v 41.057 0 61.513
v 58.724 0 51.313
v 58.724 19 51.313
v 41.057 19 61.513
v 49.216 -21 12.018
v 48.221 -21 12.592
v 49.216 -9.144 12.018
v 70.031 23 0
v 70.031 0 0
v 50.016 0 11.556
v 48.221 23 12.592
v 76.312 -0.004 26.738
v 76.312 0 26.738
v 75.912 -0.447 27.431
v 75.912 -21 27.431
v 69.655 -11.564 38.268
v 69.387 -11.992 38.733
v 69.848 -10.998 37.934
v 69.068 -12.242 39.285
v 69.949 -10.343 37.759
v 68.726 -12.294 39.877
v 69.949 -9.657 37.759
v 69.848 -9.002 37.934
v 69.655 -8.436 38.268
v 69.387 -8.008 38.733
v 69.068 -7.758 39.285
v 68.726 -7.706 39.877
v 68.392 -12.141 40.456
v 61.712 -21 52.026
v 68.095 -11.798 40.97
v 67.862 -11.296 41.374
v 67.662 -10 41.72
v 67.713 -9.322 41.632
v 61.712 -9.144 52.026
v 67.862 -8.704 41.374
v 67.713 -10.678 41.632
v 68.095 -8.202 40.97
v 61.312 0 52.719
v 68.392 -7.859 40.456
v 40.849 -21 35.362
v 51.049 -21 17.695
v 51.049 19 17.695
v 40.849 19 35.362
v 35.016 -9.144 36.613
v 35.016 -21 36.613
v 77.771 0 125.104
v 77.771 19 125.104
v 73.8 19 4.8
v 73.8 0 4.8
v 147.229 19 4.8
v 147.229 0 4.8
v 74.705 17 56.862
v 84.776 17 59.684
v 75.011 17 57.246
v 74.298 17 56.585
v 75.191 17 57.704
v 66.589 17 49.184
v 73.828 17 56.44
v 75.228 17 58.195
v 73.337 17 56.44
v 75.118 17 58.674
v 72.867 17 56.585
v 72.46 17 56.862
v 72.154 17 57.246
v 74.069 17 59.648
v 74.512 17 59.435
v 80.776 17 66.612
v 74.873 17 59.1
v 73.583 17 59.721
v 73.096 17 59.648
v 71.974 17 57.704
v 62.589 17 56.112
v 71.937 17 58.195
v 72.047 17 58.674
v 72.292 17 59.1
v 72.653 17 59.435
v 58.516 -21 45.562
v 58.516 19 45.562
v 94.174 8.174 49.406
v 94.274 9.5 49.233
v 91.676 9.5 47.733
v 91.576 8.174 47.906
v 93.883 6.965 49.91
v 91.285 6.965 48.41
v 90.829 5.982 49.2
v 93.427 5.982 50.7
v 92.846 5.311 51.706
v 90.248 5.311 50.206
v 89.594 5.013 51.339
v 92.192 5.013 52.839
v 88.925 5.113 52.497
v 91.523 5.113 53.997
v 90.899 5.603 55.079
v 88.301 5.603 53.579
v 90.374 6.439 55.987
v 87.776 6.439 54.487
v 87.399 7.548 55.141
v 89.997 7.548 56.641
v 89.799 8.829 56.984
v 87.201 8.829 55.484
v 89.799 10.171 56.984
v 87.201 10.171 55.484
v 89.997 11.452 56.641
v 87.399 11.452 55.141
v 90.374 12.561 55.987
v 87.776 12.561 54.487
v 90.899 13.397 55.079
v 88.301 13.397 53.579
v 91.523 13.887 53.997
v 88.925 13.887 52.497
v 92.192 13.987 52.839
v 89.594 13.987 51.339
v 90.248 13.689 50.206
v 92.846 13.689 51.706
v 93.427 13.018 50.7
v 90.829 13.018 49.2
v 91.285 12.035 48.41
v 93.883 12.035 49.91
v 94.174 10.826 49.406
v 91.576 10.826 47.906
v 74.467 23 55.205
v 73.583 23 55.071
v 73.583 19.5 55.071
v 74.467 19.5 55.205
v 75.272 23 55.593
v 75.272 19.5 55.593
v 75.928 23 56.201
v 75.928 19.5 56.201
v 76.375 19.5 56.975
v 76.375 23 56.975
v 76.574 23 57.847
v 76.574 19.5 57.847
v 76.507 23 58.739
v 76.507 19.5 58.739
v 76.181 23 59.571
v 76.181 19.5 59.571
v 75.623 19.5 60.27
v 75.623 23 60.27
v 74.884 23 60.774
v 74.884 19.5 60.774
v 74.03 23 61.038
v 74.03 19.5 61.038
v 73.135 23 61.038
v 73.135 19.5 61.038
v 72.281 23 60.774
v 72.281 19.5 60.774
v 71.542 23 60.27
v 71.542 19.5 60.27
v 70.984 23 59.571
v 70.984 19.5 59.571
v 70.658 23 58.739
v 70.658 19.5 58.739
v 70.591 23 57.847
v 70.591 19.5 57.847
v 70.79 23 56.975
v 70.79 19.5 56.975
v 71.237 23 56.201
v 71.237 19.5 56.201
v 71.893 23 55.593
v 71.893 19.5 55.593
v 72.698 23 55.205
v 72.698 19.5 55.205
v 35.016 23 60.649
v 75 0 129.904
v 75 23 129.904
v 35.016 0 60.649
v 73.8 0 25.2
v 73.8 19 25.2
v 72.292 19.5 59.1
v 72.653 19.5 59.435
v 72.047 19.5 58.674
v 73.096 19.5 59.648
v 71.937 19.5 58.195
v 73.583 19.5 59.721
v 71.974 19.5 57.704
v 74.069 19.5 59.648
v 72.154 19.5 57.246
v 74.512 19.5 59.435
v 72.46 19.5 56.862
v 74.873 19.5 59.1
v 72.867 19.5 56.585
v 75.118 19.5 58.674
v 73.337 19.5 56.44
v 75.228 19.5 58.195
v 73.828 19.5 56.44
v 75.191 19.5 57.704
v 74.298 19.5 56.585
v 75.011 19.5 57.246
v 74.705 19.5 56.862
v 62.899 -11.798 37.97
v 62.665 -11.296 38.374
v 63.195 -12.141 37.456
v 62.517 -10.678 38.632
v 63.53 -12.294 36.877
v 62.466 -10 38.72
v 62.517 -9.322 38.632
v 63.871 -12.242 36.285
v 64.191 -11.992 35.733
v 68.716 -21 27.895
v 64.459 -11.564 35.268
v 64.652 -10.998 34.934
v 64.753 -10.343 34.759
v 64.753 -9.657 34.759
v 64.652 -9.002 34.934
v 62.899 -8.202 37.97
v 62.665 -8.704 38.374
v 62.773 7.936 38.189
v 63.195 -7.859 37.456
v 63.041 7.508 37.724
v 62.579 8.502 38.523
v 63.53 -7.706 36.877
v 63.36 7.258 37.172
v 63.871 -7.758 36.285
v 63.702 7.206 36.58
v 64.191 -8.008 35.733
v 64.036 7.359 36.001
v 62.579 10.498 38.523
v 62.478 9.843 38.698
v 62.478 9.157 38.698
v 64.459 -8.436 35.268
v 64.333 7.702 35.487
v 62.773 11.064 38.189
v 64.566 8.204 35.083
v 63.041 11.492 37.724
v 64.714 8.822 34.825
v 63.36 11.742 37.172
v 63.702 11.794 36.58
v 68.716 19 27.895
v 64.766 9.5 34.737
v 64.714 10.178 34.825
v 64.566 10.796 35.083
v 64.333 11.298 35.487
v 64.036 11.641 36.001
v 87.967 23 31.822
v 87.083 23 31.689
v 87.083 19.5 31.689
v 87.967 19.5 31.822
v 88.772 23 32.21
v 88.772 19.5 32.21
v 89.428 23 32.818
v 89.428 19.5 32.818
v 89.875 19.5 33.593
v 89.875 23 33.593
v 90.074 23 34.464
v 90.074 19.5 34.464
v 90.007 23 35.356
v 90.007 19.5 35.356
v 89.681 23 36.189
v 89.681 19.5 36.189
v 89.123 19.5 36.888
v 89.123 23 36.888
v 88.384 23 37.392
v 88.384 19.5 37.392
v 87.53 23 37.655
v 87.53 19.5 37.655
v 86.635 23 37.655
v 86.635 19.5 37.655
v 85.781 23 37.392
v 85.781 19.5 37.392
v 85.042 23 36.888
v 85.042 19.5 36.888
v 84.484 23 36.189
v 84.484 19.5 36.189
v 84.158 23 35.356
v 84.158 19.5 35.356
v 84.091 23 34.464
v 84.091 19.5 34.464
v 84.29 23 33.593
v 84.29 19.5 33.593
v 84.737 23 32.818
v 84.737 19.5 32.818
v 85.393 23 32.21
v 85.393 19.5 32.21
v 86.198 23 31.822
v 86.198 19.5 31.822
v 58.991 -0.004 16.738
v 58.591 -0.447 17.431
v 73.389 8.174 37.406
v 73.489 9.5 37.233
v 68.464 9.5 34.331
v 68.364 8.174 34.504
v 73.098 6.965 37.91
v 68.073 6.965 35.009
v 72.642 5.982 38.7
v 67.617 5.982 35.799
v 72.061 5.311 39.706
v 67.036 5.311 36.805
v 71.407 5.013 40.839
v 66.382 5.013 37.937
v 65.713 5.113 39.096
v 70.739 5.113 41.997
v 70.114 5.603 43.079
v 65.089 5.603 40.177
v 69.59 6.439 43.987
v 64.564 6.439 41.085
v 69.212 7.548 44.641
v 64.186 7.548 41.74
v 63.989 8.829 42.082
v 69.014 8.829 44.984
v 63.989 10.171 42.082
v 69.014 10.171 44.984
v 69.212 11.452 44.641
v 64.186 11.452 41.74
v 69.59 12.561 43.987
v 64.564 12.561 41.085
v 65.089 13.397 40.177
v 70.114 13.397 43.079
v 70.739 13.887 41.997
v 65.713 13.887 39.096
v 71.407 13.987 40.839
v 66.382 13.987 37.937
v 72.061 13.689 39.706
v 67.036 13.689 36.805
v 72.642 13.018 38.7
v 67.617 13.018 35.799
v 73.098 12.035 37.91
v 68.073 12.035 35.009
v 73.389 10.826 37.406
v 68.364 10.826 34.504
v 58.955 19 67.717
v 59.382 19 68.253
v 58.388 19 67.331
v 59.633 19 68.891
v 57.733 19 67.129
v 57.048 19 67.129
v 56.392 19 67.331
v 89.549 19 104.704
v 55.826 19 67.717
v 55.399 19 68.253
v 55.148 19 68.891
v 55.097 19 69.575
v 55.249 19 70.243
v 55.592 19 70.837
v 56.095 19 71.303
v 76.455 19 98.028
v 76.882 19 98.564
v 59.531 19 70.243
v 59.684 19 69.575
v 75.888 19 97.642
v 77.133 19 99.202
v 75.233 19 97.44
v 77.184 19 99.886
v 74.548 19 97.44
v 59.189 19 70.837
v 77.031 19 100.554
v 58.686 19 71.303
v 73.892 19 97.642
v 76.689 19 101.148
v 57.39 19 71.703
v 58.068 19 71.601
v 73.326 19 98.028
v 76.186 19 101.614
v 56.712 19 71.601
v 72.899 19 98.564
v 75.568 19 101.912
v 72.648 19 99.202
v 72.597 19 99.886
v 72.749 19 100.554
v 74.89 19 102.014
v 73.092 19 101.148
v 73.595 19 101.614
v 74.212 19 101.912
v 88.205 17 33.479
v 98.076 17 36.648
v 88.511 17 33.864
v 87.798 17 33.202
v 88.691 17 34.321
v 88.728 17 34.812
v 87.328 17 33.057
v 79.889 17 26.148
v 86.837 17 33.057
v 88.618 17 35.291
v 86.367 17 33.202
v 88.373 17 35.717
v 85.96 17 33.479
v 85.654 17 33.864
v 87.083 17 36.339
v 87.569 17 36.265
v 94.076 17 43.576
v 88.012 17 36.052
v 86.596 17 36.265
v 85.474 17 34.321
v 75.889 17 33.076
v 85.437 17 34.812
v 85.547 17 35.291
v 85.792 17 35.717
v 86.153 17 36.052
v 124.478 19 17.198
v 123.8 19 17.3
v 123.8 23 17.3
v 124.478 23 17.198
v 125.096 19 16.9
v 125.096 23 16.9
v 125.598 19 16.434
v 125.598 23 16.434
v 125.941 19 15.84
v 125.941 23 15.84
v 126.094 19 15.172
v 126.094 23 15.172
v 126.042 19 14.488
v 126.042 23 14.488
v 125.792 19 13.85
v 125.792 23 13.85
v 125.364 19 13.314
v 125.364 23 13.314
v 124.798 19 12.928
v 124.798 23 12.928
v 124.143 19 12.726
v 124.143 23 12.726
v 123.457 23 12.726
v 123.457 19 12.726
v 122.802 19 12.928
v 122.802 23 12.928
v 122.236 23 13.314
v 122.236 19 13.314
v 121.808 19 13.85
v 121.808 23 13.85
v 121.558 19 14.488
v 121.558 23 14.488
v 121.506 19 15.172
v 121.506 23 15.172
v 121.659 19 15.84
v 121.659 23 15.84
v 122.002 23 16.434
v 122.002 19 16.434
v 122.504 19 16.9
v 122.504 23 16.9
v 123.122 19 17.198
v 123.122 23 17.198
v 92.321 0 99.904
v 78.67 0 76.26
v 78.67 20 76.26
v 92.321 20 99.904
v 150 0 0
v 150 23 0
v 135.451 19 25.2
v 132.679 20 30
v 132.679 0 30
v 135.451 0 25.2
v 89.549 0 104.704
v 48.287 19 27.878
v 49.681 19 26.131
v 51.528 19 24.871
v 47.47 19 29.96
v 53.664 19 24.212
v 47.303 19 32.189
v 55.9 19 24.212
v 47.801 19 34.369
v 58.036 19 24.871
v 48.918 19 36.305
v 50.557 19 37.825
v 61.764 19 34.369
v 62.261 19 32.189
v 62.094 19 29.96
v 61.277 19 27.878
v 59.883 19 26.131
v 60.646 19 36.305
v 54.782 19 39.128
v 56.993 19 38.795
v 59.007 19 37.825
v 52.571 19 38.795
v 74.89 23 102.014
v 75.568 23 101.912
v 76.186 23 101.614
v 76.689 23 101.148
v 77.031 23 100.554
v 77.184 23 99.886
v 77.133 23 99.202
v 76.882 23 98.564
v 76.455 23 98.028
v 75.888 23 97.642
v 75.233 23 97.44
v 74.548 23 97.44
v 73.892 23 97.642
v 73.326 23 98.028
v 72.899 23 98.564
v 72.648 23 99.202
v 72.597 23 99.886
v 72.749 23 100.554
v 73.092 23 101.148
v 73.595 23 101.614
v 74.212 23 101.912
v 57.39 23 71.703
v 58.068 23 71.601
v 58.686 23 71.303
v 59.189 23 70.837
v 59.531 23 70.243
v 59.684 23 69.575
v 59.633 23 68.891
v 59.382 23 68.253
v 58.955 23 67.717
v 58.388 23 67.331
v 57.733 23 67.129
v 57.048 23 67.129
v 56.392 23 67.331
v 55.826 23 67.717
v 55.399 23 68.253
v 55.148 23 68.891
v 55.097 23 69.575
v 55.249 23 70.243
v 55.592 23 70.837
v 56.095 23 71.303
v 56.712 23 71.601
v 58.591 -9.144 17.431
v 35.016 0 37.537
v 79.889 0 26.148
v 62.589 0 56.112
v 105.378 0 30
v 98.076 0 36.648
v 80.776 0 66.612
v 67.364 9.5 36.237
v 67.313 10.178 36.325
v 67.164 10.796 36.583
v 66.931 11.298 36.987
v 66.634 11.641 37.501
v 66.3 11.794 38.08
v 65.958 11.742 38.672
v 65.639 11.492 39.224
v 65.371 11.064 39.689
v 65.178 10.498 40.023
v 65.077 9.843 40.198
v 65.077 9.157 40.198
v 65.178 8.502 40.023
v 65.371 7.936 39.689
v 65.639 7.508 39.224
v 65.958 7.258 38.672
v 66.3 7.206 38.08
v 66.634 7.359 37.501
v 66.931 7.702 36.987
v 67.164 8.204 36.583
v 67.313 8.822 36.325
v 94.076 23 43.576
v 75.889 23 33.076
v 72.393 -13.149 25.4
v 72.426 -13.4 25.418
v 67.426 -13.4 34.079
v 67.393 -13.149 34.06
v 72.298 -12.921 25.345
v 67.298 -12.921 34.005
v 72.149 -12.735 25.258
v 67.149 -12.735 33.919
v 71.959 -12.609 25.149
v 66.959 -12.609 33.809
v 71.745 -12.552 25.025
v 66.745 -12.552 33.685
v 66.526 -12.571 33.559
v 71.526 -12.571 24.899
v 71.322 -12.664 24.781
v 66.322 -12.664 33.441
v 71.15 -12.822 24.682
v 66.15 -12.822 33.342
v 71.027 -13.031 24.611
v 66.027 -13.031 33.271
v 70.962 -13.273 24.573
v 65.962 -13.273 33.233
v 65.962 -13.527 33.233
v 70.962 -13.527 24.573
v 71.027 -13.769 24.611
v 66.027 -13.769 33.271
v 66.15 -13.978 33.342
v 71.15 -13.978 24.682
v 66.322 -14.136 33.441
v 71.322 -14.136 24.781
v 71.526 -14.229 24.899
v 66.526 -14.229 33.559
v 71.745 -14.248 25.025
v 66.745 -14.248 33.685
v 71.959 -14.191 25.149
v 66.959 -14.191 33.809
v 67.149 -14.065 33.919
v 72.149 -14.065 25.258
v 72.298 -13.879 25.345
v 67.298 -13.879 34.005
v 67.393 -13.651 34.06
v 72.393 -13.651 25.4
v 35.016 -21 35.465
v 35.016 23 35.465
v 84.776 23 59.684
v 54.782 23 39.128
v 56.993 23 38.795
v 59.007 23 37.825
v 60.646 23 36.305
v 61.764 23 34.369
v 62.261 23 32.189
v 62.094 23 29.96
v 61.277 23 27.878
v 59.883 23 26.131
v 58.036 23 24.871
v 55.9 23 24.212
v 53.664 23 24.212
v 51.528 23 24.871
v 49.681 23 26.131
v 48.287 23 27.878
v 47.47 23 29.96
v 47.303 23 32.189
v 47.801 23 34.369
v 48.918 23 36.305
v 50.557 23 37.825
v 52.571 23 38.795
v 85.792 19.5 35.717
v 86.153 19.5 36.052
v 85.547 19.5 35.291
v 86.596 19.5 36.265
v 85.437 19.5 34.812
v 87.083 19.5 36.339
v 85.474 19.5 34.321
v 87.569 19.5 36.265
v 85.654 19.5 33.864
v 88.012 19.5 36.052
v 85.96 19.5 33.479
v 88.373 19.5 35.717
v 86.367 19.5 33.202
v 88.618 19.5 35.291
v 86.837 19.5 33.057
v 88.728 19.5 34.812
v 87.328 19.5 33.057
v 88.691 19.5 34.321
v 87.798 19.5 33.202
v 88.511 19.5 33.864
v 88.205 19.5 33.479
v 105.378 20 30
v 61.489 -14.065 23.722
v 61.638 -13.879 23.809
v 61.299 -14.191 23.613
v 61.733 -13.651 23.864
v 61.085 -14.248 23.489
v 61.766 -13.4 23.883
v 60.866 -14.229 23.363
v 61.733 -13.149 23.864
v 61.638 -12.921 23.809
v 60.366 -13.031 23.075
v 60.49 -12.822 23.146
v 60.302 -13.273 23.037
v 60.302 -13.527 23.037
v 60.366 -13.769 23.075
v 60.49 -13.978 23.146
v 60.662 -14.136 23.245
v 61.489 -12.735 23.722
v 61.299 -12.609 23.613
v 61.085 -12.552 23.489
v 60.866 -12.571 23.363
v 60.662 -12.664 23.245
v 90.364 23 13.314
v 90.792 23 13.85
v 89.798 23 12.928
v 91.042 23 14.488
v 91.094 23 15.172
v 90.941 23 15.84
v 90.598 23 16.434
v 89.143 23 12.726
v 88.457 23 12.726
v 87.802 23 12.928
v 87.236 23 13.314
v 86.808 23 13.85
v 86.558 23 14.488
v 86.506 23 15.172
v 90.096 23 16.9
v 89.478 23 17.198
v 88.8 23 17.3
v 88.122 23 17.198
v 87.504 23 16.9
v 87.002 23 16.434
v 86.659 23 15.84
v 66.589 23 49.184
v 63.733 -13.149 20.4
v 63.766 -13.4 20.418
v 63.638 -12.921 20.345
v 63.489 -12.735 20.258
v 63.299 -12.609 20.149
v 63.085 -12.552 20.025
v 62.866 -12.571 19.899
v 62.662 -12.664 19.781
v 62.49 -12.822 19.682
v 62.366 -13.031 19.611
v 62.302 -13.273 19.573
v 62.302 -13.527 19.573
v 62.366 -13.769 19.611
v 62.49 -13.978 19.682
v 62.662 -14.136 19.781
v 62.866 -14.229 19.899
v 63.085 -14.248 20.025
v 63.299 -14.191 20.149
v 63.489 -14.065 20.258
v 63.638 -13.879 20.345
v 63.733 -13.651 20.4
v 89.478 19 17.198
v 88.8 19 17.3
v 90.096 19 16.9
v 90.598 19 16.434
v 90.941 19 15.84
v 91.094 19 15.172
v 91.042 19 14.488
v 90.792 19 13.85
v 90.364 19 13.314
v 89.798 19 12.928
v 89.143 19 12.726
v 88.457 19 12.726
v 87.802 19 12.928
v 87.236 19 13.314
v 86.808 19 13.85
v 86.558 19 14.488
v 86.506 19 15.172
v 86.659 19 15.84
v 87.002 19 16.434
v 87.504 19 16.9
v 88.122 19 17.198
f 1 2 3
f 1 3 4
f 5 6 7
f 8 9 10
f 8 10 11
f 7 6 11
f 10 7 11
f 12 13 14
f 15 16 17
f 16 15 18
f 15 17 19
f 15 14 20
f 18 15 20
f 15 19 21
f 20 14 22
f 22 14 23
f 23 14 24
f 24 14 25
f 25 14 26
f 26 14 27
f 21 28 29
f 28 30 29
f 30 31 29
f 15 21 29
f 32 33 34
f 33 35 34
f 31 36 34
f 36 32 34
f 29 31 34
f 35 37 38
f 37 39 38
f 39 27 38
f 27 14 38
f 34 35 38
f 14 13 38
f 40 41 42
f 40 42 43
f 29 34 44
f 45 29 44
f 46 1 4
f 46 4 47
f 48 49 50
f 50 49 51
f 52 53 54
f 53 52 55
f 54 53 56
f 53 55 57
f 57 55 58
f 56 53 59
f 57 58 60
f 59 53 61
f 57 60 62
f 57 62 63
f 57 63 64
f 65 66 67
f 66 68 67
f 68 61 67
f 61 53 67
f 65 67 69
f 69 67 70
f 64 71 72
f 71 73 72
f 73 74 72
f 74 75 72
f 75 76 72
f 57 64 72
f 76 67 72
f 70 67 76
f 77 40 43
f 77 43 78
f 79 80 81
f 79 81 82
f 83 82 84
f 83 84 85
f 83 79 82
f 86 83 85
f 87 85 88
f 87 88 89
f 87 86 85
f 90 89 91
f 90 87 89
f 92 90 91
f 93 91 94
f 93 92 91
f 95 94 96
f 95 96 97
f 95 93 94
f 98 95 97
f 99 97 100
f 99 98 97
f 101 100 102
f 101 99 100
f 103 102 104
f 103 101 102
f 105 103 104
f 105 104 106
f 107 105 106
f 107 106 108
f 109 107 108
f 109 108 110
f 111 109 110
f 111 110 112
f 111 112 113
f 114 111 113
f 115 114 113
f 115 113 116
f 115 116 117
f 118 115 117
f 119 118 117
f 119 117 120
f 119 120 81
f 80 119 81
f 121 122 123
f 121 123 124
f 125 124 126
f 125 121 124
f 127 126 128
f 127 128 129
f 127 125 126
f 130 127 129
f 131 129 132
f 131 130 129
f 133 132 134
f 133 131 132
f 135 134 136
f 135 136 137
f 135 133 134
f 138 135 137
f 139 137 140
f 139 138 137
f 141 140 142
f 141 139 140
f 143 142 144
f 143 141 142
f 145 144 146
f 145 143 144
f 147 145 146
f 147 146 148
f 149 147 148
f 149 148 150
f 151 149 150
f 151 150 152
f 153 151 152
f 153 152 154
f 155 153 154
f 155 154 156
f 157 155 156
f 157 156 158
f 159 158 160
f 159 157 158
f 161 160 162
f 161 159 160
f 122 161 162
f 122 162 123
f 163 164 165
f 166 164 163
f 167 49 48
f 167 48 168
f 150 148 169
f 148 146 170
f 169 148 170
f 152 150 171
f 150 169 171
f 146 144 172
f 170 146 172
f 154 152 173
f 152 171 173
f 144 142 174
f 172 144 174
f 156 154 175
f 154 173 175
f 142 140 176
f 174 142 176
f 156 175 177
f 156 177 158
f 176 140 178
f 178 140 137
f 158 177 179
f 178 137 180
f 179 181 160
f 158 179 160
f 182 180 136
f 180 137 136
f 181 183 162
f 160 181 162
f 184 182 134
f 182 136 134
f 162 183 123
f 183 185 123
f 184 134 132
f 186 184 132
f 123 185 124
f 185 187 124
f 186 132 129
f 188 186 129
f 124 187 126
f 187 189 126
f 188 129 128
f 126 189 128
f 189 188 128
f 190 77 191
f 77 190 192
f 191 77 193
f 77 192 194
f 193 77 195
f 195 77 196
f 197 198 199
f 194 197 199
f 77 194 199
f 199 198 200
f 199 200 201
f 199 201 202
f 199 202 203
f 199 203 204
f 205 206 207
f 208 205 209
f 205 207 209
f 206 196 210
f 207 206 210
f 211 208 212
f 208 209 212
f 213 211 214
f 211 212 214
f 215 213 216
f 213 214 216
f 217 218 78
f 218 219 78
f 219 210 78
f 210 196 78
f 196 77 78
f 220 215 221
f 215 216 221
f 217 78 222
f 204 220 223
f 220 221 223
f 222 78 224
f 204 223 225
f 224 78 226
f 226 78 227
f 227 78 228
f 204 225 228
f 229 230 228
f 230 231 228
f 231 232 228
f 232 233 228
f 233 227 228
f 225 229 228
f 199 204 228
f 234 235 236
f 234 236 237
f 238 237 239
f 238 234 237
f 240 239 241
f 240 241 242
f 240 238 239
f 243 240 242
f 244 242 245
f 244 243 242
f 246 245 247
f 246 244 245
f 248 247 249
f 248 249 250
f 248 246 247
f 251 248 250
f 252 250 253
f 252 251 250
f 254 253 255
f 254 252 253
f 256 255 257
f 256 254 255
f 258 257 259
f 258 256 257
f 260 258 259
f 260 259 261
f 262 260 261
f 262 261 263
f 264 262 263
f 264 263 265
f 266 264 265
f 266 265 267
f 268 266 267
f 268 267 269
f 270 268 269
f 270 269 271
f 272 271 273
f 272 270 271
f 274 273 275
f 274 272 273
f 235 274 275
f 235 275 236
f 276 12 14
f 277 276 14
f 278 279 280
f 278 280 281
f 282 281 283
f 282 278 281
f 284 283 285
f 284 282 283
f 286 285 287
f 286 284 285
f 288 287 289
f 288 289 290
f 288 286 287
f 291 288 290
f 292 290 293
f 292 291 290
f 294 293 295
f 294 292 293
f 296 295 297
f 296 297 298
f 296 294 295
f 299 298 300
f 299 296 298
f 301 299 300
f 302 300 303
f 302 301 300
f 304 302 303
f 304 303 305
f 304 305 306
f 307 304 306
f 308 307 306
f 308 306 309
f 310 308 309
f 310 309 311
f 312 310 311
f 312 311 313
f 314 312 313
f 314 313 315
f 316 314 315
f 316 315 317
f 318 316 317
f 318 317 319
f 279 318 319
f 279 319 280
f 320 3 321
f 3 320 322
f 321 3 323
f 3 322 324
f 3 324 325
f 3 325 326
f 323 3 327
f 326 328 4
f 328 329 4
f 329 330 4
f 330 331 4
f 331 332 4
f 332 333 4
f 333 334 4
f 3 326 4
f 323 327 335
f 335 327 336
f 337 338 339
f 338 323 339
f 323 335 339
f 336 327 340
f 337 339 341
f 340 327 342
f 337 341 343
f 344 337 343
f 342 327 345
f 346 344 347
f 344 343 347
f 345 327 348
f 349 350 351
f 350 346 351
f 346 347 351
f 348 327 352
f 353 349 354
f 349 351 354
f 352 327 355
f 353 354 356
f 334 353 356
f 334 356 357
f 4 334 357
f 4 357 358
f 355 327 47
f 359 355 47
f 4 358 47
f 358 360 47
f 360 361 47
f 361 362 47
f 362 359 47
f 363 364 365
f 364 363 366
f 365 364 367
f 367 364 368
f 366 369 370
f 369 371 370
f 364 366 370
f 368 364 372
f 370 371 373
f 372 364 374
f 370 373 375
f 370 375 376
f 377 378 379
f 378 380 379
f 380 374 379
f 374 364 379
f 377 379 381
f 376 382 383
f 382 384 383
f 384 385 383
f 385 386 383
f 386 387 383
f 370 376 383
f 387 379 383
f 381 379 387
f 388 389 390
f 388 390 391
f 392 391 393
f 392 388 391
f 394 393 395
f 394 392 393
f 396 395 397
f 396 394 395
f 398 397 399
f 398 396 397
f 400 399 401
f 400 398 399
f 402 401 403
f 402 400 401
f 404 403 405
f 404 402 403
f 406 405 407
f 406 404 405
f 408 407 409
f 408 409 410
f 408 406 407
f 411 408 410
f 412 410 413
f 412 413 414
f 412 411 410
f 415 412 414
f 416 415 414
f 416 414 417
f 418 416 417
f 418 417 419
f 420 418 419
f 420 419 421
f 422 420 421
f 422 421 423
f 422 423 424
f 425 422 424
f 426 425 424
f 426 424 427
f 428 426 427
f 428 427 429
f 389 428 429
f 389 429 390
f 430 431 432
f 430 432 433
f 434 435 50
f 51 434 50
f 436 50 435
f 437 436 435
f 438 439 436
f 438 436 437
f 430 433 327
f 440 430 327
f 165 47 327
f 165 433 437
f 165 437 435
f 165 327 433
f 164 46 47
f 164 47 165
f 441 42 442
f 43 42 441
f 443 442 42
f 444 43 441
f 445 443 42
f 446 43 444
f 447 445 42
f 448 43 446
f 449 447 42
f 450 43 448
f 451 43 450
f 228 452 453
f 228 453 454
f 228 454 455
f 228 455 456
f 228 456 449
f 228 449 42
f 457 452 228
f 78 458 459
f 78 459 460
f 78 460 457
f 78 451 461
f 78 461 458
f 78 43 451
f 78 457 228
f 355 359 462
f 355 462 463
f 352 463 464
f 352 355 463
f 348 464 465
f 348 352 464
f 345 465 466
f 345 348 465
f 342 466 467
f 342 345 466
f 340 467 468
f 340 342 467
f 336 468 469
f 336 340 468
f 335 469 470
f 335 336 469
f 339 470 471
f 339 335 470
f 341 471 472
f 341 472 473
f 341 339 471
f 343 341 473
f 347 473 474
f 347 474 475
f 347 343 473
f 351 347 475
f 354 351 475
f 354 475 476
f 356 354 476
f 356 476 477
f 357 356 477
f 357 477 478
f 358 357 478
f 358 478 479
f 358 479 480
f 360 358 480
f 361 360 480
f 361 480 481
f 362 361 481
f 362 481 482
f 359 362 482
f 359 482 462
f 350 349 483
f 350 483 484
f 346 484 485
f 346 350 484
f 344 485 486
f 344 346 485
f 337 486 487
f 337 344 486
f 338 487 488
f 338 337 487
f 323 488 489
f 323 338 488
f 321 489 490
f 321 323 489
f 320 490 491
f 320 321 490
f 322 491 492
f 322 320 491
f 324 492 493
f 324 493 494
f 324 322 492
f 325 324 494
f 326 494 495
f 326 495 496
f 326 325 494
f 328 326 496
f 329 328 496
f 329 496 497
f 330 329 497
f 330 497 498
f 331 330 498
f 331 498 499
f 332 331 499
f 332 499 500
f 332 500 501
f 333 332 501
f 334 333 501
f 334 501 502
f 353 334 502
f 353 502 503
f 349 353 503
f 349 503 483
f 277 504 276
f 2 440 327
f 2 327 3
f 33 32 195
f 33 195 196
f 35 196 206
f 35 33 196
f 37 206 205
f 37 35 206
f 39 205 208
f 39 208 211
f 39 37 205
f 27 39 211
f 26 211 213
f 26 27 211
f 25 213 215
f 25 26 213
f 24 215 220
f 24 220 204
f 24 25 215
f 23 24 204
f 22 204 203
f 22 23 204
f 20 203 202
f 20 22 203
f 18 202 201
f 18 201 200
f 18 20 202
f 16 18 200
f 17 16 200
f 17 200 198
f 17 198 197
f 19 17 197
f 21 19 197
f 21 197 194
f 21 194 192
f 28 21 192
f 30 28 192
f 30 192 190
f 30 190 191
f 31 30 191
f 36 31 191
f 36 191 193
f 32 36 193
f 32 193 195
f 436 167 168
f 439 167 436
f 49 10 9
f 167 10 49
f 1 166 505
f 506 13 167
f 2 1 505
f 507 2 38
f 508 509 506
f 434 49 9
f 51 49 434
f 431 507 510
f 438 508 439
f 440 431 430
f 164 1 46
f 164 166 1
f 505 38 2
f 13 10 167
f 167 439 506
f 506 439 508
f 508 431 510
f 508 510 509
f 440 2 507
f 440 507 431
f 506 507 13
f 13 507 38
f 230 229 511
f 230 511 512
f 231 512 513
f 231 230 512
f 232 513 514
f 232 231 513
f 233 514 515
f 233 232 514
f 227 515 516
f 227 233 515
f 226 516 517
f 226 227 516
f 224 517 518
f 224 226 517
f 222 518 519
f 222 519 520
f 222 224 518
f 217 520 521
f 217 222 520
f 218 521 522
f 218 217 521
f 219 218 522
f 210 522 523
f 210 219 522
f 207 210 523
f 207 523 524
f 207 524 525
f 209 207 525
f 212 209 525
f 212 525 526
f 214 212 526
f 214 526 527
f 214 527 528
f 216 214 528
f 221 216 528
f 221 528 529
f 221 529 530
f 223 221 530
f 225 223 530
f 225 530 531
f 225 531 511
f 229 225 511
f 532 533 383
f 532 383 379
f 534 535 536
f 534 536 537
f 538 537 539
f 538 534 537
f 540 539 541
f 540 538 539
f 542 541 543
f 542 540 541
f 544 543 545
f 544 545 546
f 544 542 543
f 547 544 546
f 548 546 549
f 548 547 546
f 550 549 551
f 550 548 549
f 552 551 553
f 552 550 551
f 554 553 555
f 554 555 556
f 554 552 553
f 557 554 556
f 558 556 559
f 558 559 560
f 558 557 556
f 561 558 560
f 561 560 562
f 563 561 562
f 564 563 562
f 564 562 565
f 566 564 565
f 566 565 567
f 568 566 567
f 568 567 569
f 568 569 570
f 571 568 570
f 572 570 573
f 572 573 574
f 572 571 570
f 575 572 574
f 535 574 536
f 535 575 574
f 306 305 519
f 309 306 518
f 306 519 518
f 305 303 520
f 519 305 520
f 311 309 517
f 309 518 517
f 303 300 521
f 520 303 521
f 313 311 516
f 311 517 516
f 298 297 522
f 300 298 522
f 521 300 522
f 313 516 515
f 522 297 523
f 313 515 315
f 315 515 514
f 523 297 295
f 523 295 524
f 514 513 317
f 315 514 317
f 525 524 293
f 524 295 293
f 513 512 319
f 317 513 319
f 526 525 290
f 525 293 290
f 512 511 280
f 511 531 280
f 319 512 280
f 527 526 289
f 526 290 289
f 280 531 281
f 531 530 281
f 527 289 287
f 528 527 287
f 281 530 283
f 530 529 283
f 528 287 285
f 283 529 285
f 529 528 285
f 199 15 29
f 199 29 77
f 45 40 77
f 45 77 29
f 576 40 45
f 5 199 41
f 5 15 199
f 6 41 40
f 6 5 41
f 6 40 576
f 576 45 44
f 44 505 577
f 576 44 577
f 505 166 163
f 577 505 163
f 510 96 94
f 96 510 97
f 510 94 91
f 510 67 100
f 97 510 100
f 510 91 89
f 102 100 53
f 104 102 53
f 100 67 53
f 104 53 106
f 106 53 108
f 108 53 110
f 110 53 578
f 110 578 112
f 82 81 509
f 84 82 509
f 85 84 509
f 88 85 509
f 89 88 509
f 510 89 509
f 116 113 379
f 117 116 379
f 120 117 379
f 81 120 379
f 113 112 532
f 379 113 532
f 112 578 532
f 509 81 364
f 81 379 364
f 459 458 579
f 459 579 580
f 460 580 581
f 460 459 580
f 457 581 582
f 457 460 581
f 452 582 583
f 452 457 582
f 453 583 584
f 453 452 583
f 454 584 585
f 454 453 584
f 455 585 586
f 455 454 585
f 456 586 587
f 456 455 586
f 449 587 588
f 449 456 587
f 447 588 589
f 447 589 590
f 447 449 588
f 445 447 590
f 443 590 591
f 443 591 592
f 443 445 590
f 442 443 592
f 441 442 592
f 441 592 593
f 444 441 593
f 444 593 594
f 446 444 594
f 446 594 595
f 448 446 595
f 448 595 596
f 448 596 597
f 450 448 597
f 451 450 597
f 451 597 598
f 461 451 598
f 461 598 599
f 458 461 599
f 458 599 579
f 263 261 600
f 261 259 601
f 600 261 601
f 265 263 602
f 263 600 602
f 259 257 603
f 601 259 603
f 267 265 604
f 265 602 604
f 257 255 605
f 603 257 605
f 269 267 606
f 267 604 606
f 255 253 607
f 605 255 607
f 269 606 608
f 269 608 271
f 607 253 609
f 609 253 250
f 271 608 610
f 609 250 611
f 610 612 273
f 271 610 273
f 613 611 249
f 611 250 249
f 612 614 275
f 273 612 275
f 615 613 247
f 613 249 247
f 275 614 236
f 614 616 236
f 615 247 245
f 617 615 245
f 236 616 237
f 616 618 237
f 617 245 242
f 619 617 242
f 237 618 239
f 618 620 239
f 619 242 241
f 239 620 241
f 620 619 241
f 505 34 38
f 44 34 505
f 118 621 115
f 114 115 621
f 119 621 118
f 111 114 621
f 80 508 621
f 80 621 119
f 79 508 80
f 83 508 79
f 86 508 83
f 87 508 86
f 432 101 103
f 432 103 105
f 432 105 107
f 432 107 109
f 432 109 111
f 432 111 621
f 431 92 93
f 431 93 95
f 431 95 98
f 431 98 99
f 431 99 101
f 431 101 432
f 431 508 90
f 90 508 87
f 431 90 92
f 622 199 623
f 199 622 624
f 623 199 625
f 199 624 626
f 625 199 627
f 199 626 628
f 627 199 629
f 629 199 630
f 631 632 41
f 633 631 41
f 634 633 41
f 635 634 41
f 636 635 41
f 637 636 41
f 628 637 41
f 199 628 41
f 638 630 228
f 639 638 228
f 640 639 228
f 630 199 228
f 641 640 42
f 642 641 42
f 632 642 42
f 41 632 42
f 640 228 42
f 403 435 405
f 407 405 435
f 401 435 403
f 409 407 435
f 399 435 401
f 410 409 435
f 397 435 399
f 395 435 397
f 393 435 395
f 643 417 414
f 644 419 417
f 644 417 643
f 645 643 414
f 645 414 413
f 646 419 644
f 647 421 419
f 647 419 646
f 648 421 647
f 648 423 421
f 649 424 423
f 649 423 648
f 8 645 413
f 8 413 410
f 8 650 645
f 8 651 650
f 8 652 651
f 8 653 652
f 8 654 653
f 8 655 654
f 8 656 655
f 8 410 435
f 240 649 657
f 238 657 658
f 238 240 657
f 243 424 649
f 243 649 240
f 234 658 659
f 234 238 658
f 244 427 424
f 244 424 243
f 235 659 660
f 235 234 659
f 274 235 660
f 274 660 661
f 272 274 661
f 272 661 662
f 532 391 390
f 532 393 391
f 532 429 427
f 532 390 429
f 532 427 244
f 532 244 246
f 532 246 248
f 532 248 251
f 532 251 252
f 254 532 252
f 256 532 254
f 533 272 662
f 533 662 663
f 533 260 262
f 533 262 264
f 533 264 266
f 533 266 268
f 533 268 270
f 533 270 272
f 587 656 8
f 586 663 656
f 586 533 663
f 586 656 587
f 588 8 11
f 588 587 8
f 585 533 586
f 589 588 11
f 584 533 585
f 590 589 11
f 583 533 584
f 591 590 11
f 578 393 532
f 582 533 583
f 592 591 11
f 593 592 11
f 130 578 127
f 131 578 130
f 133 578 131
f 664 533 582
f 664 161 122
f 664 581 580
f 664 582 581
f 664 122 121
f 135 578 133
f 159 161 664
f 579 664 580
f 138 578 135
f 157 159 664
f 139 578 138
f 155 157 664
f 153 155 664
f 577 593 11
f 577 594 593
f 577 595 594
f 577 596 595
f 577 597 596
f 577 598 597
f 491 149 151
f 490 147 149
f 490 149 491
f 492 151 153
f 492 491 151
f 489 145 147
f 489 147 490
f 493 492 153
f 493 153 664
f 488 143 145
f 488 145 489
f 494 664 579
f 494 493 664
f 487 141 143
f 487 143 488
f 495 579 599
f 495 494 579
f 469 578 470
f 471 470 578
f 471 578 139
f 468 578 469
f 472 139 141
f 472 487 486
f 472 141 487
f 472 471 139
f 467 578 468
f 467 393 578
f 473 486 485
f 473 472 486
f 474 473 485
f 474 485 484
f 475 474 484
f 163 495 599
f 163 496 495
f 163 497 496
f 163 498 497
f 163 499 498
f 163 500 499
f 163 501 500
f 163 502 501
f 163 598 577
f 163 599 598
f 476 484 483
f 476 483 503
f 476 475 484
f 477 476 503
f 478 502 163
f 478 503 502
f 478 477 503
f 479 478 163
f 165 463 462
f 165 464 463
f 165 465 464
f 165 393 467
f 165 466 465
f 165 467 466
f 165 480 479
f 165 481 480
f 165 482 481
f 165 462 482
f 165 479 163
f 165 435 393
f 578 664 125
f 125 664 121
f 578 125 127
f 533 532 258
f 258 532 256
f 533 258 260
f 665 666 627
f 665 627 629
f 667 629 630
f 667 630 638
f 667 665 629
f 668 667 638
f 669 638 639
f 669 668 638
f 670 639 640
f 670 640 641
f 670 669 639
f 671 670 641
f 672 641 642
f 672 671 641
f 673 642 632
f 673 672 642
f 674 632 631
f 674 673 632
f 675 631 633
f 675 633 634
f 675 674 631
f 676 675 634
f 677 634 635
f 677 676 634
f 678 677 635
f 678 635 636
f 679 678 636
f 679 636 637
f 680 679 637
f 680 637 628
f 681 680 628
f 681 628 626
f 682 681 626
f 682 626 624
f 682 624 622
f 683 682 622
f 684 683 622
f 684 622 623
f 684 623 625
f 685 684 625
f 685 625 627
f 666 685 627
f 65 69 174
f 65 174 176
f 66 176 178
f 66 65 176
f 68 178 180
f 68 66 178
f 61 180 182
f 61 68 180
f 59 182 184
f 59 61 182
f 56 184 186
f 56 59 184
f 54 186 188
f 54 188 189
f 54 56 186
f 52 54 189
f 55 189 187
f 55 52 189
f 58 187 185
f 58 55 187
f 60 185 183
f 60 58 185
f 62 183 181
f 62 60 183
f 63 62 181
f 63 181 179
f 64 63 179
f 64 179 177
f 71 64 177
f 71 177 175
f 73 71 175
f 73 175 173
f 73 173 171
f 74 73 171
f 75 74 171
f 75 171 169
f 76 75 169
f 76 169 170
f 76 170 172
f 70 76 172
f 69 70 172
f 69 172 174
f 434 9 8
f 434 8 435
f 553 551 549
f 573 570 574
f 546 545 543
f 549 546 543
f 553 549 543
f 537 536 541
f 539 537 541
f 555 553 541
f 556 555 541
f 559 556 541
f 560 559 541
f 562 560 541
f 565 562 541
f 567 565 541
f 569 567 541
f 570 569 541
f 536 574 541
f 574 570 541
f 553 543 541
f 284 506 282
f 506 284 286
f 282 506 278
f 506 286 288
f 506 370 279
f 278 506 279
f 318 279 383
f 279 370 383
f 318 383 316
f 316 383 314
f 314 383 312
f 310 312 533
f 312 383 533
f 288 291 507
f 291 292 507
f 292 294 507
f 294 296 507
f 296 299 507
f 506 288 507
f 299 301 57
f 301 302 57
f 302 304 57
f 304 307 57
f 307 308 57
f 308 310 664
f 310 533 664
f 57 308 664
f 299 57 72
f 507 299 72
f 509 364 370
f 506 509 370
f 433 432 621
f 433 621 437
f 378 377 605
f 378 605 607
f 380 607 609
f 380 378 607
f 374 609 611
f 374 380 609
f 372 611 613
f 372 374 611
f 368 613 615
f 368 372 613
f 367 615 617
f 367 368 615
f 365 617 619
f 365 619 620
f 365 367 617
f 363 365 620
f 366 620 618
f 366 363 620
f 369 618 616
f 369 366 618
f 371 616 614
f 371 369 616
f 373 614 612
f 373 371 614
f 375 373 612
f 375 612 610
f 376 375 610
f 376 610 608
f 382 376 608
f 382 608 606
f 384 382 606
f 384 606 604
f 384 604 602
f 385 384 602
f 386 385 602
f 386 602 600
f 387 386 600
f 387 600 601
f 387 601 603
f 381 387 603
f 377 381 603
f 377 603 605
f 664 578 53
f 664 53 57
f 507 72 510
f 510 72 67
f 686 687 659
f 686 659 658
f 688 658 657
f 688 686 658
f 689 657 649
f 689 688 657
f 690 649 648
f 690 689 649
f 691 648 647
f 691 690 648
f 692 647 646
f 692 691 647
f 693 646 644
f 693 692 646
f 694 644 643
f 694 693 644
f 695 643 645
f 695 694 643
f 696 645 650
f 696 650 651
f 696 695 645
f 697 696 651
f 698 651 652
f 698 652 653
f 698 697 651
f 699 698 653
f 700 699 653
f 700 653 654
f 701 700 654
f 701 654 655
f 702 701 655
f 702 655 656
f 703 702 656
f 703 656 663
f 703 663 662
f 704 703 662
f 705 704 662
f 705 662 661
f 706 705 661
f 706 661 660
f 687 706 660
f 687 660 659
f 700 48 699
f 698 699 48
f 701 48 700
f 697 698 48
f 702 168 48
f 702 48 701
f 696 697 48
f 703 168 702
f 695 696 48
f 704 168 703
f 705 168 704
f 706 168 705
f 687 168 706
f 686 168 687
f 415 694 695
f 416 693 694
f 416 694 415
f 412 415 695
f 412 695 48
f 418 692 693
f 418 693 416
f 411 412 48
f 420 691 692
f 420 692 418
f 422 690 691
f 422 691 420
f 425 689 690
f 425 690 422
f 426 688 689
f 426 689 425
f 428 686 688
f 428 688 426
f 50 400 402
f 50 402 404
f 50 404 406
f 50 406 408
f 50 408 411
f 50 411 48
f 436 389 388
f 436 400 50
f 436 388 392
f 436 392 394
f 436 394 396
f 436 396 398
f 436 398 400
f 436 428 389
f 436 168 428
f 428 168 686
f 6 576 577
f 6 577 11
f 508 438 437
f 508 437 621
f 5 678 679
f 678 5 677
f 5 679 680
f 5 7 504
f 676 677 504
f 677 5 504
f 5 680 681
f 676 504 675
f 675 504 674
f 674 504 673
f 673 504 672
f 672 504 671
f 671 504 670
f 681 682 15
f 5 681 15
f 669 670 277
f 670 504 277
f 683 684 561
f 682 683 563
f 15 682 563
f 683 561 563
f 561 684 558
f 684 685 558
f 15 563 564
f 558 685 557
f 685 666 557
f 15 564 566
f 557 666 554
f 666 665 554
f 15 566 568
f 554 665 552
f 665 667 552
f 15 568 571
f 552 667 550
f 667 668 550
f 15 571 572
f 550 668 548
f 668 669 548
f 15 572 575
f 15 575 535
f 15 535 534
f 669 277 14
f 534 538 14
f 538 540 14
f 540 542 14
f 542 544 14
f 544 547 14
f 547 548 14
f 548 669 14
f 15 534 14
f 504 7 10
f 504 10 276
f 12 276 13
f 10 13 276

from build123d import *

# Parameters (mm, degrees)
BOSS_EXTRUDE1_DEPTH      = 23
SKETCH2_W                = 100.39999999999999
SKETCH2_H                = 20.400000000000002
CUT_EXTRUDE2_DEPTH       = 19
CUT_EXTRUDE3_DEPTH       = 19
CUT_EXTRUDE11_DEPTH      = 200.75985582694003
CUT_EXTRUDE11_DEPTH_BACK = 200.75985582694003
CUT_EXTRUDE10_DEPTH      = 20
SKETCH38_R               = 2.299999999999993
SKETCH38_R_2             = 2.300000000000006
SKETCH38_R_3             = 2.2999999999999985
SKETCH38_R_4             = 2.299999999999992
CUT_EXTRUDE24_DEPTH      = 10
BOSS_EXTRUDE2_DEPTH      = 6
SKETCH40_R               = 1.6500000000000017
CUT_EXTRUDE25_DEPTH      = 200.1582285520733
SKETCH41_R               = 3.0000000000000084
CUT_EXTRUDE26_DEPTH      = 3.5
SKETCH45_R               = 2.3
CUT_EXTRUDE29_DEPTH      = 130.1236252028075
SKETCH47_R               = 7.499999999999999
CUT_EXTRUDE31_DEPTH      = 10
CUT_EXTRUDE32_DEPTH      = 200.75985582694003
BOSS_EXTRUDE3_DEPTH      = 21
CUT_EXTRUDE33_DEPTH      = 200.75985582694003
CHAMFER6_SIZE            = 0.8
CHAMFER6_SIZE2           = 9.144041842209413
SKETCH51_R               = 4.5
CUT_EXTRUDE34_DEPTH      = 29.803050969
SKETCH52_R               = 2.3
CUT_EXTRUDE35_DEPTH      = 10
SKETCH53_W               = 20.000000000000007
SKETCH53_H               = 20
CUT_EXTRUDE36_DEPTH      = 10
SKETCH54_R               = 0.8500000000000069
CUT_EXTRUDE37_DEPTH      = 10
CHAMFER7_SIZE            = 1
CHAMFER7_SIZE_2          = 1.710027066
CHAMFER5_SIZE            = 14.54
CHAMFER4_SIZE            = 14.54


with BuildPart() as part:
    # Sketch1 → Boss-Extrude1 (new body)
    with BuildSketch(Plane(origin=(0, 0, 0), x_dir=(1, 0, 0), z_dir=(0, 1, 0))):
        Polygon((0, 0), (149.99999999999937, 0), (74.99999999999966, 129.903810567666), align=None)
    extrude(amount=BOSS_EXTRUDE1_DEPTH)

    # Sketch2 → Cut-Extrude2 (cut)
    with BuildSketch(Plane(origin=(0, 0, 0), x_dir=(1, 0, 0), z_dir=(0, 1, 0))):
        Polygon((108.9238401753675, 138.2616253392494), (58.72384017536752, 51.31267479929176), (41.05692193816496, 61.51267479929177), (91.25692193816495, 148.4616253392494), align=None)
        with Locations((124, 15.000000000000002)):
            Rectangle(SKETCH2_W, SKETCH2_H)
    extrude(amount=CUT_EXTRUDE2_DEPTH, mode=Mode.SUBTRACT)

    # Sketch4 → Cut-Extrude3 (cut)
    with BuildSketch(Plane(origin=(0, 0, 0), x_dir=(1, 0, 0), z_dir=(0, 1, 0))):
        Polygon((58.51558394542647, 45.56193363414623), (40.84866570822394, 35.36193363414623), (51.048665708223936, 17.69501539694368), (68.71558394542647, 27.895015396943673), align=None)
    extrude(amount=CUT_EXTRUDE3_DEPTH, mode=Mode.SUBTRACT)

    # Sketch22 → Cut-Extrude11 (cut, two sides: drawn at the far end of the back side and taken through both)
    with BuildSketch(Plane.XZ.offset(-CUT_EXTRUDE11_DEPTH_BACK)):
        Polygon((79.88924971530794, -26.147760514529192), (62.58924971530795, -56.11223948547077), (80.77578319478118, -66.61223948547077), (98.07578319478117, -36.64776051452918), align=None)
    extrude(amount=CUT_EXTRUDE11_DEPTH + CUT_EXTRUDE11_DEPTH_BACK, mode=Mode.SUBTRACT)

    # Sketch21 → Cut-Extrude10 (cut)
    with BuildSketch(Plane.XZ):
        Polygon((132.67949192431067, -29.999999999999993), (105.37797113249052, -29.999999999999993), (78.6697476797782, -76.26000000000042), (92.32050807568827, -99.90381056766569), align=None)
    extrude(amount=-CUT_EXTRUDE10_DEPTH, mode=Mode.SUBTRACT)

    # Sketch38 → Cut-Extrude24 (cut)
    with BuildSketch(Plane.XZ.offset(-19)):
        with Locations(Location((88.79999999999998, -15, 0), (0, 0, 270))):
            Circle(SKETCH38_R)
        with Locations(Location((123.8, -15, 0), (0, 0, 270))):
            Circle(SKETCH38_R_2)
        with Locations(Location((57.390381056766245, -69.40305585605834, 0), (0, 0, 270))):
            Circle(SKETCH38_R_3)
        with Locations(Location((74.89038105676623, -99.7139449885137, 0), (0, 0, 270))):
            Circle(SKETCH38_R_4)
    extrude(amount=-CUT_EXTRUDE24_DEPTH, mode=Mode.SUBTRACT)

    # Sketch39 → Boss-Extrude2 (add)
    with BuildSketch(Plane(origin=(0, 23, 0), x_dir=(1, 0, 0), z_dir=(0, 1, 0))):
        Polygon((62.58924971530795, 56.11223948547077), (80.77578319478118, 66.61223948547077), (84.77578319478118, 59.68403625519526), (66.58924971530797, 49.18403625519524), align=None)
        Polygon((98.07578319478117, 36.64776051452918), (79.88924971530794, 26.147760514529192), (75.88924971530795, 33.0759637448047), (94.07578319478117, 43.575963744804696), align=None)
    extrude(amount=-BOSS_EXTRUDE2_DEPTH)

    # Sketch40 → Cut-Extrude25 (cut, through all)
    with BuildSketch(Plane.XZ.offset(-17)):
        with Locations(Location((87.08251645504455, -34.68865704891005, 0), (0, 0, 270))):
            Circle(SKETCH40_R)
        with Locations(Location((73.58251645504457, -58.071342951089896, 0), (0, 0, 270))):
            Circle(SKETCH40_R)
    extrude(amount=-CUT_EXTRUDE25_DEPTH, mode=Mode.SUBTRACT)

    # Sketch41 → Cut-Extrude26 (cut)
    with BuildSketch(Plane(origin=(0, 23, 0), x_dir=(1, 0, 0), z_dir=(0, 1, 0))):
        with Locations(Location((73.58251645504457, 58.071342951089896, 0), (0, 0, 270))):
            Circle(SKETCH41_R)
        with Locations(Location((87.08251645504455, 34.68865704891005, 0), (0, 0, 270))):
            Circle(SKETCH41_R)
    extrude(amount=-CUT_EXTRUDE26_DEPTH, mode=Mode.SUBTRACT)

    # Sketch45 → Cut-Extrude29 (cut, through all)
    with BuildSketch(Plane(origin=(63.615583945425506, 0, -36.72847451554663), x_dir=(0.5, 0, 0.8660254037844386), z_dir=(-0.8660254037844387, 0, 0.5000000000000001))):
        with Locations((1.94809e-12, 9.5)):
            Circle(SKETCH45_R)
    extrude(amount=-CUT_EXTRUDE29_DEPTH, mode=Mode.SUBTRACT)

    # Sketch47 → Cut-Extrude31 (cut)
    with BuildSketch(Plane.XZ.offset(-19)):
        with Locations(Location((54.78212482682521, -31.62847451554496, 0), (0, 0, 270))):
            Circle(SKETCH47_R)
    extrude(amount=-CUT_EXTRUDE31_DEPTH, mode=Mode.SUBTRACT)

    # Sketch48 → Cut-Extrude32 (cut, through all)
    with BuildSketch(Plane.XZ):
        Polygon((55.491384919067684, 2e-17), (27.74569245953363, -48.05694903109369), (0, 0), align=None)
    extrude(amount=-CUT_EXTRUDE32_DEPTH, mode=Mode.SUBTRACT)

    # Sketch49 → Boss-Extrude3 (add)
    with BuildSketch(Plane.XZ):
        Polygon((48.718538689301745, -11.730913781805928), (75.91173636813312, -27.430913781805906), (61.7117363681331, -52.026035249283986), (34.51853868930174, -36.326035249284), align=None)
    extrude(amount=BOSS_EXTRUDE3_DEPTH)

    # Sketch50 → Cut-Extrude33 (cut, through all)
    with BuildSketch(Plane(origin=(0, 0, 0), x_dir=(1, 0, 0), z_dir=(0, 1, 0))):
        Polygon((40.84866570822394, 35.36193363414623), (58.51558394542647, 45.56193363414623), (68.71558394542649, 27.895015396943673), (51.048665708223936, 17.69501539694368), align=None)
    extrude(amount=-CUT_EXTRUDE33_DEPTH, mode=Mode.SUBTRACT)

    # Chamfer6
    chamfer6_edges = [part.edges().sort_by_distance(p)[0] for p in [
        (48.115137528717426, 0, -44.17603524928399),
        (62.31513752871743, 0, -19.58091378180592),
    ]]
    chamfer6_side = [part.faces().sort_by_distance(p)[0] for p in [
        (48.99845735329998, 0, -54.86781762841321),
    ]]
    chamfer(chamfer6_edges, length=CHAMFER6_SIZE, length2=CHAMFER6_SIZE2, reference=chamfer6_side[0])

    # Sketch51 → Cut-Extrude34 (cut)
    with BuildSketch(Plane(origin=(92.02385940613446, 0, -53.129999999999995), x_dir=(-0.4999999999999997, 0, -0.8660254037844388), z_dir=(0.8660254037844388, 0, -0.4999999999999997))):
        with Locations(Location((-1.92901e-12, 9.5, 0), (0, 0, 180))):
            Circle(SKETCH51_R)
    extrude(amount=-CUT_EXTRUDE34_DEPTH, mode=Mode.SUBTRACT)

    # Sketch52 → Cut-Extrude35 (cut)
    with BuildSketch(Plane(origin=(68.8117363681321, 0, -39.72847451554662), x_dir=(-0.49999999999999983, 0, -0.8660254037844387), z_dir=(0.8660254037844387, 0, -0.49999999999999983))):
        with Locations((-1.388e-14, -10)):
            Circle(SKETCH52_R)
    extrude(amount=-CUT_EXTRUDE35_DEPTH, mode=Mode.SUBTRACT)

    # Sketch53 → Cut-Extrude36 (cut)
    with BuildSketch(Plane(origin=(7.10000000000096, 0, 12.297560733740706), x_dir=(0.8660254037844387, 0, -0.49999999999999983), z_dir=(0.49999999999999983, 0, 0.8660254037844387))):
        with Locations((69.45694903109329, -11)):
            Rectangle(SKETCH53_W, SKETCH53_H)
    extrude(amount=CUT_EXTRUDE36_DEPTH, mode=Mode.SUBTRACT)

    # Sketch54 → Cut-Extrude37 (cut)
    with BuildSketch(Plane(origin=(7.10000000000096, 0, 12.297560733740706), x_dir=(0.8660254037844387, 0, -0.49999999999999983), z_dir=(0.49999999999999983, 0, 0.8660254037844387))):
        with Locations((64.5819490310929, -13.3999999999983)):
            Circle(SKETCH54_R)
        with Locations((74.58194903109292, -13.399999999998368)):
            Circle(SKETCH54_R)
    extrude(amount=-CUT_EXTRUDE37_DEPTH, mode=Mode.SUBTRACT)

    # Chamfer7
    # the kernel refuses this chamfer: 1.710027066, 1 mm, written as the material it takes off along each edge
    with BuildSketch(Plane(origin=(80.10050658552632, -1.0000000000000009, -29.026564170563404), x_dir=(0.07067759261755262, 0.9899589444048419, 0.12241718137025635), z_dir=(-0.866025403784439, 0, 0.49999999999999933))) as chamfer7_piece_1_section:
        Polygon((CHAMFER7_SIZE * 0.998511767905, CHAMFER7_SIZE * 0.0545366789897), (-CHAMFER7_SIZE_2 * 0.141355185248, CHAMFER7_SIZE_2 * 0.989958944496), (0, 0), align=None)
    chamfer7_piece_1 = extrude(amount=24.42540661325694, mode=Mode.PRIVATE)
    chamfer7_piece_1 = split(chamfer7_piece_1, bisect_by=Plane(origin=(69.16773960486616, -0.5972584462527297, -23.537265435119764), z_dir=(0.4999999999999995, 0, 0.866025403784439)), keep=Keep.TOP, mode=Mode.PRIVATE)
    add(chamfer7_piece_1, mode=Mode.SUBTRACT)

    # Chamfer5
    chamfer5_edges = [part.edges().sort_by_distance(p)[0] for p in [
        (55.491384919067684, 11.5, 2e-17),
    ]]
    chamfer(chamfer5_edges, length=CHAMFER5_SIZE)

    # Chamfer4
    chamfer4_edges = [part.edges().sort_by_distance(p)[0] for p in [
        (27.74569245953363, 11.5, -48.05694903109369),
    ]]
    chamfer(chamfer4_edges, length=CHAMFER4_SIZE)


with BuildPart() as body_2:
    # Mirror1: mirrored copy
    add(part.part.mirror(Plane.XY))


solid = body_2.part
